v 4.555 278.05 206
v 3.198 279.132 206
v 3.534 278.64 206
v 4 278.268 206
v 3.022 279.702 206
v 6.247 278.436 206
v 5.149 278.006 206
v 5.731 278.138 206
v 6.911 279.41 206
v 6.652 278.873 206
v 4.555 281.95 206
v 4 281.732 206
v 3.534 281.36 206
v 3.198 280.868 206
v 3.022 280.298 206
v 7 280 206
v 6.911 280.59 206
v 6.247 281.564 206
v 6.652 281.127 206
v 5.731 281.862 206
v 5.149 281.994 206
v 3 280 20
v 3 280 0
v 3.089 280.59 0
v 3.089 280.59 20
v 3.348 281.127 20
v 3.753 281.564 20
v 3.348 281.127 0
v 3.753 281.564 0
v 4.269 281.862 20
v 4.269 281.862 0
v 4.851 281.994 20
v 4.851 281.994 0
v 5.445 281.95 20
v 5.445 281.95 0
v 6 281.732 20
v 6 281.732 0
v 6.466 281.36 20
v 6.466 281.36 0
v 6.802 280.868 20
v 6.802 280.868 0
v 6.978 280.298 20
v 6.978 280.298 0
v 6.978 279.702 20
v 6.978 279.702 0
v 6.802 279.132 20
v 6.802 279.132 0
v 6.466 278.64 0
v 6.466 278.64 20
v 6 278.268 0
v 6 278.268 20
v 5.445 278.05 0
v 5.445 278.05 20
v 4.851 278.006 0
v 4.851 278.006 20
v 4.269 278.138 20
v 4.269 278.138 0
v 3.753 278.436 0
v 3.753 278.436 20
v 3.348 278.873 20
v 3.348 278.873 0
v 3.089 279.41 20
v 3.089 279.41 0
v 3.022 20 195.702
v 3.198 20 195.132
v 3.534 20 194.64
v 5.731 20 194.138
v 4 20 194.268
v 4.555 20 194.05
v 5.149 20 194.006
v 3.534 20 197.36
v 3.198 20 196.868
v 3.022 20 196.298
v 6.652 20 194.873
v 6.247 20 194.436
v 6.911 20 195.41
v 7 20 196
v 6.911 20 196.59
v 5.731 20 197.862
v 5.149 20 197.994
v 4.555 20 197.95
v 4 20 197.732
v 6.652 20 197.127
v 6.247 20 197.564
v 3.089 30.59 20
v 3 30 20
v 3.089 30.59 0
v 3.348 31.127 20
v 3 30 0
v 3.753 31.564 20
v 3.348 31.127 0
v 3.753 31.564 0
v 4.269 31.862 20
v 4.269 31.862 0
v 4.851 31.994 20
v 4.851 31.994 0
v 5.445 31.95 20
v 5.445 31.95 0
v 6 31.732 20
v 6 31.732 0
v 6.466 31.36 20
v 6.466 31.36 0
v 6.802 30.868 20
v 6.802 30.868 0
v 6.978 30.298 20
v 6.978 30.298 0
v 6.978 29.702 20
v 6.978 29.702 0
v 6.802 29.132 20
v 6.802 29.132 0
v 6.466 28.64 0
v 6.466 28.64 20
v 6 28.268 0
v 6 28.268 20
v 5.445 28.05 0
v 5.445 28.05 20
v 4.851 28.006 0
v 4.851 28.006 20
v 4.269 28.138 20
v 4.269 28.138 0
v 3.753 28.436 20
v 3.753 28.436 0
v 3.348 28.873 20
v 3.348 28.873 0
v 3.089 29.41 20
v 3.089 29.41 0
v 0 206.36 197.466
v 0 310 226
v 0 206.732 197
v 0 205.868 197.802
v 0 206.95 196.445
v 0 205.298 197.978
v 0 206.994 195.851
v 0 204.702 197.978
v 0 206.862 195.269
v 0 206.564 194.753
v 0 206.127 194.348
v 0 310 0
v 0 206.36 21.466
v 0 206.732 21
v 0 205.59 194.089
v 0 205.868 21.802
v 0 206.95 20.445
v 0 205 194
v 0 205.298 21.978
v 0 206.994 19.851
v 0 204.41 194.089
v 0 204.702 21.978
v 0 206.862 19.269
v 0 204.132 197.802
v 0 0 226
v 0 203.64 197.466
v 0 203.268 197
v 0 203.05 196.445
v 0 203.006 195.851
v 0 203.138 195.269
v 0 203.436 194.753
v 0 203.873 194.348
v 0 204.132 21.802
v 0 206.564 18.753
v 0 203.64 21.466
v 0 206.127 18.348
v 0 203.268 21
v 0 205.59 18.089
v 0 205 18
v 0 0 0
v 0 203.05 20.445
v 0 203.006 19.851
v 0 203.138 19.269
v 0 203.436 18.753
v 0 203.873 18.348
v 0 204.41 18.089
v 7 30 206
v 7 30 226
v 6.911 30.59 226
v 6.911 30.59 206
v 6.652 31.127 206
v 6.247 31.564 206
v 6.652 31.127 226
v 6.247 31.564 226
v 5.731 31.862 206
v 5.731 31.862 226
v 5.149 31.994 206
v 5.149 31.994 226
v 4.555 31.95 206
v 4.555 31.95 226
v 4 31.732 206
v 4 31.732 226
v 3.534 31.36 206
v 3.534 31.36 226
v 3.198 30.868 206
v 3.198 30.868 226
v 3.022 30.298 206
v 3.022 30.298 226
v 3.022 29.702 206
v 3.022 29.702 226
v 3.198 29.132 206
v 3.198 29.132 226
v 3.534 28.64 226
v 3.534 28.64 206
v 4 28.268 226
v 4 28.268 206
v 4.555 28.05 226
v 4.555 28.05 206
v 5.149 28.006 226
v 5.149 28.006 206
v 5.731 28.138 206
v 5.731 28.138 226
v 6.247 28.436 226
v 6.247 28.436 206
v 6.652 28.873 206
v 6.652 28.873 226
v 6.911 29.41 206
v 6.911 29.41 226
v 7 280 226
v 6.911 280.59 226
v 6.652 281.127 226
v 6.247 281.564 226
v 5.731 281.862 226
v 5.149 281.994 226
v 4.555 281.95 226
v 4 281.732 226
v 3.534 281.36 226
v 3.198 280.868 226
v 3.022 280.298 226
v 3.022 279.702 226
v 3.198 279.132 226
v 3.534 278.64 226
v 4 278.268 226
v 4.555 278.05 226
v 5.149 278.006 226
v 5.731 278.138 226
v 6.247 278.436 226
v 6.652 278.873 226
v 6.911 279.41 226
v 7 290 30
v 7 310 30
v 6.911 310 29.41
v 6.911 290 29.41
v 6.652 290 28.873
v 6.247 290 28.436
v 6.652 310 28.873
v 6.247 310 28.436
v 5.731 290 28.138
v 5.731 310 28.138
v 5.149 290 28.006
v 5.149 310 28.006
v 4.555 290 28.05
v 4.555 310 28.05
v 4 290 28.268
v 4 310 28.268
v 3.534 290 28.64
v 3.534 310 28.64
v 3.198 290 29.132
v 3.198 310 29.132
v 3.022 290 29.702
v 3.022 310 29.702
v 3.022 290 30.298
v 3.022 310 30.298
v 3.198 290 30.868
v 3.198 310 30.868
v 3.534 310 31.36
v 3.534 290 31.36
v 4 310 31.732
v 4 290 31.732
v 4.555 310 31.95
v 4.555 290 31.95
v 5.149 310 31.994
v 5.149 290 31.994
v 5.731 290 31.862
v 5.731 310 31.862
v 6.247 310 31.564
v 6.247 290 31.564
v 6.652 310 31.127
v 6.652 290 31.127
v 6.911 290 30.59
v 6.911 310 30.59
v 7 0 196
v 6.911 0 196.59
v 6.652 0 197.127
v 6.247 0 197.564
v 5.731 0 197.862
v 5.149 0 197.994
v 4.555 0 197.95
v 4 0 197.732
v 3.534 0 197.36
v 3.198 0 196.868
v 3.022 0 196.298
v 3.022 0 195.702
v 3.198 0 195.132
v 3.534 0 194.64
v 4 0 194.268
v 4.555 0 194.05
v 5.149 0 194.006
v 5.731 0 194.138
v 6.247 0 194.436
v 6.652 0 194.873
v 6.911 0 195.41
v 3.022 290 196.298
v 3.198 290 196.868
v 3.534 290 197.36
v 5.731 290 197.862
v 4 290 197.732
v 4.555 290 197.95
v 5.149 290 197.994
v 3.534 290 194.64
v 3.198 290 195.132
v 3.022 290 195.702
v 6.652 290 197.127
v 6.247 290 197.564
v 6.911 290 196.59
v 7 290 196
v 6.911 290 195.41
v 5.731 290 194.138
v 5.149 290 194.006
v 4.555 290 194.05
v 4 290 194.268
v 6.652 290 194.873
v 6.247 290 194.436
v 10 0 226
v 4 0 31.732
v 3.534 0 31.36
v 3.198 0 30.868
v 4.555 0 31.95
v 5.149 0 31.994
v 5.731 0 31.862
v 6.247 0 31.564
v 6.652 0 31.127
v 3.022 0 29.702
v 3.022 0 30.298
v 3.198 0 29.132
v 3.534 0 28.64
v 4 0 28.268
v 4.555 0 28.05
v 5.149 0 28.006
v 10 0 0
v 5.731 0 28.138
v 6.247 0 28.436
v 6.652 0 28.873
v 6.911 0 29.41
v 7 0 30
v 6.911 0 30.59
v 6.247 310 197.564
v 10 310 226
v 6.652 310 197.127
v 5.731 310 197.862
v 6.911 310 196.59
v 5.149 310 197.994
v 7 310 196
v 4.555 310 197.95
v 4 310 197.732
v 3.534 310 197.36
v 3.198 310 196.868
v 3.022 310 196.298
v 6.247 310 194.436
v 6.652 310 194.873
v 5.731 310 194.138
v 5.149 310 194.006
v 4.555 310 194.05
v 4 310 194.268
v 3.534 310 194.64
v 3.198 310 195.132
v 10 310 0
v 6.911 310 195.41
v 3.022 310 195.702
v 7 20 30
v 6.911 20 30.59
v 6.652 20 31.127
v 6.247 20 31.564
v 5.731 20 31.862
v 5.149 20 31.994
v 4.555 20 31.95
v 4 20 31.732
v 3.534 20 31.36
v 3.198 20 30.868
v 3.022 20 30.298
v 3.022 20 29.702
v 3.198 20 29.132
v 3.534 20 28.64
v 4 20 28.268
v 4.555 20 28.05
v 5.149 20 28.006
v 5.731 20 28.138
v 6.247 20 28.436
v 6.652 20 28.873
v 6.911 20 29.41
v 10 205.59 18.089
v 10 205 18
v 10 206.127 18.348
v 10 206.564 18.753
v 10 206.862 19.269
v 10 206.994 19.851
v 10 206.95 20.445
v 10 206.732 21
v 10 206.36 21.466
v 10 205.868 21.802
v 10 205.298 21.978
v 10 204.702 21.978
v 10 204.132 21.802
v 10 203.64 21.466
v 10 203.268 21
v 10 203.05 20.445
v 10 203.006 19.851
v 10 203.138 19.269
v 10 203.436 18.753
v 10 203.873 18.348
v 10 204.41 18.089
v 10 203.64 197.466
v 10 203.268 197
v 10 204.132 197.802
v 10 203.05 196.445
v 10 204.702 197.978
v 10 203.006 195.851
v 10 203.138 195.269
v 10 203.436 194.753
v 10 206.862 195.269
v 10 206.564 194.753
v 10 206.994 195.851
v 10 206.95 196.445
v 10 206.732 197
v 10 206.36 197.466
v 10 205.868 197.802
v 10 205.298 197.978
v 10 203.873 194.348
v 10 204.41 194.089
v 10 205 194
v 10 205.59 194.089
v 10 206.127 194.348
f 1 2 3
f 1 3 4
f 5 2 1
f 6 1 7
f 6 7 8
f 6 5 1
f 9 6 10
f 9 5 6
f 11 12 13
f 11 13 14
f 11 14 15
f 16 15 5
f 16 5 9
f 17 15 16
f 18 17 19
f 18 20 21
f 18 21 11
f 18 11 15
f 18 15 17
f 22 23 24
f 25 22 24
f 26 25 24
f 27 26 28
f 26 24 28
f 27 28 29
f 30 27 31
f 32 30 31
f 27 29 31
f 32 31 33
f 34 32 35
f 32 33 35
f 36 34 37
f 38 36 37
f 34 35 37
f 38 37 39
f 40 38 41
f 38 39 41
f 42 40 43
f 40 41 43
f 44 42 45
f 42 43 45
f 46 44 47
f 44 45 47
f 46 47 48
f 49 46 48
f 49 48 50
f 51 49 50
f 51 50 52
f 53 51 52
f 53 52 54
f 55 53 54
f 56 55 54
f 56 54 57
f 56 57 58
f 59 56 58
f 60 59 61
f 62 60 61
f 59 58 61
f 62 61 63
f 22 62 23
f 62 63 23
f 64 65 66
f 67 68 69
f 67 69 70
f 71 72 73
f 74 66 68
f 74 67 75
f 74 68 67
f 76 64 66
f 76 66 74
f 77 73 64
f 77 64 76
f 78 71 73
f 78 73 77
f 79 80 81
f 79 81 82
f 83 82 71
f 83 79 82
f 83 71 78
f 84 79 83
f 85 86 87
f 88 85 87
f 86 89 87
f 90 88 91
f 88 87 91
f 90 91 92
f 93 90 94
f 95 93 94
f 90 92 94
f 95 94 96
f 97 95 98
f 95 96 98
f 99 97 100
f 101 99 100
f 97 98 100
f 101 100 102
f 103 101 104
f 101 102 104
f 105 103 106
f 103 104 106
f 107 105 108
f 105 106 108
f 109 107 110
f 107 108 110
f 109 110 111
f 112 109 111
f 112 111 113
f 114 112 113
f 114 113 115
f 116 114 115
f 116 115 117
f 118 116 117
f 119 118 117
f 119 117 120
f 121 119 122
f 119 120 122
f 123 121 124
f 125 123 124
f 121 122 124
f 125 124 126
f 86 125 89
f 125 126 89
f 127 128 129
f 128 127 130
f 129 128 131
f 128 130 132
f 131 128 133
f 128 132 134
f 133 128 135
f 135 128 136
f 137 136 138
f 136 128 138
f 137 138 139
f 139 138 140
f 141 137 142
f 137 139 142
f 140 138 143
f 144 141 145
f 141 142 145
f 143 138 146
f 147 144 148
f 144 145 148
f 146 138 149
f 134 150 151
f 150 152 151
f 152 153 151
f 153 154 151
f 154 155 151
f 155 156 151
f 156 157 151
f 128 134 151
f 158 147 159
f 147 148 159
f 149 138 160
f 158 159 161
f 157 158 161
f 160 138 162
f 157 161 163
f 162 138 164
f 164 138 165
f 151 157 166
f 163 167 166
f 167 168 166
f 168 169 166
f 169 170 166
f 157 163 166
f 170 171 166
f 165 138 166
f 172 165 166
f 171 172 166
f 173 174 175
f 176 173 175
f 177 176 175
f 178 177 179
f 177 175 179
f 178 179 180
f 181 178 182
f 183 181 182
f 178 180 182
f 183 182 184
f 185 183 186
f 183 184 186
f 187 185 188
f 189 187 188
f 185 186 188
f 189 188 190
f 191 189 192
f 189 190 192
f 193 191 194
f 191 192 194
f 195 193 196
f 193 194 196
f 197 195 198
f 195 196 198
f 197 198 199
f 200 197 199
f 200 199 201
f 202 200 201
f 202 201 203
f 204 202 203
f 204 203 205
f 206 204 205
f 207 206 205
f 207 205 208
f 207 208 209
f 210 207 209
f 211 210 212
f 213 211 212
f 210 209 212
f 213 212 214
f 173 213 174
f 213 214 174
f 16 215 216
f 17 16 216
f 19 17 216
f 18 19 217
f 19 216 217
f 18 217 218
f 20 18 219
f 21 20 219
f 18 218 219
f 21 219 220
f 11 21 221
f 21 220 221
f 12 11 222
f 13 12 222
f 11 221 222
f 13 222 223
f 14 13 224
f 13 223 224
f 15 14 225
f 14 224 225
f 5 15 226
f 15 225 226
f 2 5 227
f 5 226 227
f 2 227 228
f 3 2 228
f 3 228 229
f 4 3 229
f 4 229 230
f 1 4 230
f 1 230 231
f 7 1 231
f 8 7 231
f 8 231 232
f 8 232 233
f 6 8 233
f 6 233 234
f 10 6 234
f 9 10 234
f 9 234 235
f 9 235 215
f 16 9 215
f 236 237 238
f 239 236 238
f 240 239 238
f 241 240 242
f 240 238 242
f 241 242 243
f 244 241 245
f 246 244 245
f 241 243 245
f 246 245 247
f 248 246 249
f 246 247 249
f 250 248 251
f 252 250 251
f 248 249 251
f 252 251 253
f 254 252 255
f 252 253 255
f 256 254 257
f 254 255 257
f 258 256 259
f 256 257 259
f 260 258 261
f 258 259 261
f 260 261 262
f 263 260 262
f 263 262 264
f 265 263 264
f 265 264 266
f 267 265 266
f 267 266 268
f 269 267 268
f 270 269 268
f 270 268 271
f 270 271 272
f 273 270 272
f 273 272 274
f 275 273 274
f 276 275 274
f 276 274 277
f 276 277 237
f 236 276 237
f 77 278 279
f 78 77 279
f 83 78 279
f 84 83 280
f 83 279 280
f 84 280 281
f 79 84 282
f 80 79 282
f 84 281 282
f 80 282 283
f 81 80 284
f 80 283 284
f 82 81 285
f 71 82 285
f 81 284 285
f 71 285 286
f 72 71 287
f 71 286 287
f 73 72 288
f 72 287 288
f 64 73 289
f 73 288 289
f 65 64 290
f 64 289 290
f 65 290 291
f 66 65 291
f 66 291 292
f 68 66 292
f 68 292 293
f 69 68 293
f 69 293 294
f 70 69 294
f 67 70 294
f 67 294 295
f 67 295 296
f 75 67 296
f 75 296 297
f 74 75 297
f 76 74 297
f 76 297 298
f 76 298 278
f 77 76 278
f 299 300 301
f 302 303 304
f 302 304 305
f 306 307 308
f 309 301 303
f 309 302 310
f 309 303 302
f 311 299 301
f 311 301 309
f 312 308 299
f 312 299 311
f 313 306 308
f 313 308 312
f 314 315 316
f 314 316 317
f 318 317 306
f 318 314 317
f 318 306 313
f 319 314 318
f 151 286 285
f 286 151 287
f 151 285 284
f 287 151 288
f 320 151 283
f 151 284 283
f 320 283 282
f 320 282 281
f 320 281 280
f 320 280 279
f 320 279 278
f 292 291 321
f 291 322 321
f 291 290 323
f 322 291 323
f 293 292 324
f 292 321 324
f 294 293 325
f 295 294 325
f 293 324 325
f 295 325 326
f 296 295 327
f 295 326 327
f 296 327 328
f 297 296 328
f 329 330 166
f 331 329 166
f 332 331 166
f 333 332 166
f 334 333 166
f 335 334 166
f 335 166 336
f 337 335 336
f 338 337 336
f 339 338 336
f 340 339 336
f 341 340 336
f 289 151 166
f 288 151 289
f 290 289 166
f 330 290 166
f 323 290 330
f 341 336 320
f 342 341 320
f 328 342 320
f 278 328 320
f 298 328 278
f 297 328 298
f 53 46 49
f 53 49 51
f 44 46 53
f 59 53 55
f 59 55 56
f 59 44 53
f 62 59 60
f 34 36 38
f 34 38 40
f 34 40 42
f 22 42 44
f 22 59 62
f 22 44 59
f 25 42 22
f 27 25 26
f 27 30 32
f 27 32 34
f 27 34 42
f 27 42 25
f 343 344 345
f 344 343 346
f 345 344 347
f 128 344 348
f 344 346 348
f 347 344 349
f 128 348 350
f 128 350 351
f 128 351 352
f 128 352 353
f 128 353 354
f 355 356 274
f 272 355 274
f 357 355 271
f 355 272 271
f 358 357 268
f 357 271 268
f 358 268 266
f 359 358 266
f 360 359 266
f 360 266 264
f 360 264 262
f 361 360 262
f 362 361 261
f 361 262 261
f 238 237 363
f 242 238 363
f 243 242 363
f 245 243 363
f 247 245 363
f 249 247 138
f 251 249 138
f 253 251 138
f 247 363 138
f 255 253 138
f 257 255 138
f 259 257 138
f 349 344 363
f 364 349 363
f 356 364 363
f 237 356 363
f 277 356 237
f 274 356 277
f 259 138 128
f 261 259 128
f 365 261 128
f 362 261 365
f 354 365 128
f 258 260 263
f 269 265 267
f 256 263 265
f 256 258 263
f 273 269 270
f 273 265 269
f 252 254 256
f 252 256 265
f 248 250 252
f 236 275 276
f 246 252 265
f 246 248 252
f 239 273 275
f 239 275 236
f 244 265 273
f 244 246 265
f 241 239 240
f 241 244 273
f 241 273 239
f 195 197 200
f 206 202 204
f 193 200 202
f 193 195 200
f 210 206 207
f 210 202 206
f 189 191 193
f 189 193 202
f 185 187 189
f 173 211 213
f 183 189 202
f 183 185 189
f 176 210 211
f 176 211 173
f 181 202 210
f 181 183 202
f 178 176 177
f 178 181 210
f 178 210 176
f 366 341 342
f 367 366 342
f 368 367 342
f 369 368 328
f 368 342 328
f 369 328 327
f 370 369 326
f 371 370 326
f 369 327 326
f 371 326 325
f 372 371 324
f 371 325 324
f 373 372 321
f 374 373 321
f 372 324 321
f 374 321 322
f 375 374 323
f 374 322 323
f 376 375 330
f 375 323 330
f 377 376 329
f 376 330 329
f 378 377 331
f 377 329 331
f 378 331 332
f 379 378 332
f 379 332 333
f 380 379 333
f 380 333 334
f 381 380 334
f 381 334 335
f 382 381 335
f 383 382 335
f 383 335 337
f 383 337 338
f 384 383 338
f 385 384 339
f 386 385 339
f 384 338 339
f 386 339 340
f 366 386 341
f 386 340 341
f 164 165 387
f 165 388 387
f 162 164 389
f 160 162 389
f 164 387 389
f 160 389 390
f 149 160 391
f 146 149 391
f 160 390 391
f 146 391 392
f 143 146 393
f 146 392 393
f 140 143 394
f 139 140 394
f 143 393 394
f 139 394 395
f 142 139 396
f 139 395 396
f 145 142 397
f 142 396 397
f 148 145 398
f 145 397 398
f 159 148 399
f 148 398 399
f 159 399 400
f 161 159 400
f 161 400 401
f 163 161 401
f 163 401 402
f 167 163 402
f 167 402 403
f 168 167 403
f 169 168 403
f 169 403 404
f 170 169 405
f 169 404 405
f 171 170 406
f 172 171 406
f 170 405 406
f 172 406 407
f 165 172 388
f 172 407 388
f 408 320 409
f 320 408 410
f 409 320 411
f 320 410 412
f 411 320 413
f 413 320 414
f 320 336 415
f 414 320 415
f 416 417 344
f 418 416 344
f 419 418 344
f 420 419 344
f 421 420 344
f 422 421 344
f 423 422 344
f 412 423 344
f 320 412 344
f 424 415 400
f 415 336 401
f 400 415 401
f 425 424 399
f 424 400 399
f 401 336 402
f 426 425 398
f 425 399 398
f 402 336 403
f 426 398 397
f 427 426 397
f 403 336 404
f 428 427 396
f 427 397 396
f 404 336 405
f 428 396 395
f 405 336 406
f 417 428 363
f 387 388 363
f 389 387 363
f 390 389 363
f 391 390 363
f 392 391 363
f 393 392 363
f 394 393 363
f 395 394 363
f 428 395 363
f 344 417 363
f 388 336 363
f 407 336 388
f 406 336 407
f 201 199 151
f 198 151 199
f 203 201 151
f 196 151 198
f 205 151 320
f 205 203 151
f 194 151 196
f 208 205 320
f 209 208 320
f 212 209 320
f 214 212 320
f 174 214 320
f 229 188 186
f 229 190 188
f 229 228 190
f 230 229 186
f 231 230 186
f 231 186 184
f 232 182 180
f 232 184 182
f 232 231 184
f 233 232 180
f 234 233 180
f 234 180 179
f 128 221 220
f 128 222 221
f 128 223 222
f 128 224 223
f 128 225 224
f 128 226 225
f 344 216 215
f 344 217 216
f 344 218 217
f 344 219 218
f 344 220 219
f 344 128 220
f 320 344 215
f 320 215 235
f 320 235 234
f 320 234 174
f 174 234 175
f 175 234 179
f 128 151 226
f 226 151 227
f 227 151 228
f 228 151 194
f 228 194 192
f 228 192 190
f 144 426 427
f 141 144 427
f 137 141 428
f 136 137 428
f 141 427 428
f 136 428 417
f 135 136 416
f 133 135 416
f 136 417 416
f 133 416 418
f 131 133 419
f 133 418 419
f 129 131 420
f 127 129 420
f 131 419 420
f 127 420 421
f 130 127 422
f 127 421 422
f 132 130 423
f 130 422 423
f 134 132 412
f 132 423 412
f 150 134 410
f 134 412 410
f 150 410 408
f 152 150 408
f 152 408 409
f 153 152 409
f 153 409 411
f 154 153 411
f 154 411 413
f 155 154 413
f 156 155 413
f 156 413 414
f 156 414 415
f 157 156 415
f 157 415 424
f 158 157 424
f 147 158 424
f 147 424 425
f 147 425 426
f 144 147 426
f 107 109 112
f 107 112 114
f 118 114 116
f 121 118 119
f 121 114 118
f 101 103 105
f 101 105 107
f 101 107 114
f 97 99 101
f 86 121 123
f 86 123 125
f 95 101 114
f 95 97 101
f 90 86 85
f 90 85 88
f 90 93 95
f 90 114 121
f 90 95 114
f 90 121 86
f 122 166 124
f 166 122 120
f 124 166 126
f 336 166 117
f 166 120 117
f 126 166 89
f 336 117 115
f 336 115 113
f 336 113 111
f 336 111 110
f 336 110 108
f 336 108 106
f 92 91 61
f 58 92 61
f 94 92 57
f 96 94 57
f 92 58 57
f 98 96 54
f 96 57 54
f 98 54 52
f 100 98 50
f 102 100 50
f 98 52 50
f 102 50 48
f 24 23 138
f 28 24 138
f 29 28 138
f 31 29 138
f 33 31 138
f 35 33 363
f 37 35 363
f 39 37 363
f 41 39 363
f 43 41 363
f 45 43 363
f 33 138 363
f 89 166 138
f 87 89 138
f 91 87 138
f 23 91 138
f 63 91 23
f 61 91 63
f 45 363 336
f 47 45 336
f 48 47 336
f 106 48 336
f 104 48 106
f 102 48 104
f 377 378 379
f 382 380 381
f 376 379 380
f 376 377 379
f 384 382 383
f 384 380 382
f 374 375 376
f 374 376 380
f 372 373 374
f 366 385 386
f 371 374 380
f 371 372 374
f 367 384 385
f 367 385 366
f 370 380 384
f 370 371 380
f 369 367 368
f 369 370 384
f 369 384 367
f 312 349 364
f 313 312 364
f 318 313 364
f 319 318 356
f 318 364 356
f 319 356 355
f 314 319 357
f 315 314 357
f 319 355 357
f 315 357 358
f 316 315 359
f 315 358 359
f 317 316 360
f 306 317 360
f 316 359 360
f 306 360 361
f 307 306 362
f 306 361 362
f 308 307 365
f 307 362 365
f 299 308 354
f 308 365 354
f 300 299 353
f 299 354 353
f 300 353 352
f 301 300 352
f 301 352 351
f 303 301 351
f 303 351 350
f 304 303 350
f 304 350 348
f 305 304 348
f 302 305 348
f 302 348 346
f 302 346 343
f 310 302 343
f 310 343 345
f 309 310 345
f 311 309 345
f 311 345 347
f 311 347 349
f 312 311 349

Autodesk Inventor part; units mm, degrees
ref_plane "YZ Plane" through (0, 0, 0) normal (1, 0, 0) x (0, 1, 0)
ref_plane "XZ Plane" through (0, 0, 0) normal (0, 1, 0) x (-1, 0, 0)
ref_plane "XY Plane" through (0, 0, 0) normal (0, 0, 1) x (1, 0, 0)
sketch "Sketch1" plane through (0, 0, 0) normal (0, 0, 1) x (1, 0, 0)
  line L0 (0, 0) -> (10, 0)
  line L1 (10, 0) -> (10, 310)
  line L2 (10, 310) -> (0, 310)
  line L3 (0, 310) -> (0, 0)
  dimension "d0" = 10
  dimension "d1" = 310
extrude "Extrusion1" add sketch "Sketch1" along normal blind 226
sketch "Sketch2" plane through (0, 0, 226) normal (0, 0, 1) x (1, 0, 0)
  circle A0 centre (5, 30) radius 2
  line L0 (0, 0) -> (10, 0) projected
  line L1 (0, 310) -> (0, 0) projected
  circle A1 centre (5, 280) radius 2
  dimension "d4" = 4
  dimension "d5" = 30
  dimension "d6" = 5
  dimension "d9" = 250
extrude "Extrusion2" cut sketch "Sketch2" against normal blind 20
sketch "Sketch3" plane through (0, 0, 0) normal (0, 0, -1) x (-1, 0, 0)
  circle A0 centre (-5, 30) radius 2
  line L0 (0, 0) -> (-10, 0) projected
  line L1 (-10, 0) -> (-10, 310) projected
  circle A1 centre (-5, 280) radius 2
  dimension "d16" = 4
  dimension "d17" = 30
  dimension "d18" = 5
  dimension "d21" = 250
extrude "Extrusion3" cut sketch "Sketch3" against normal blind 20
sketch "Sketch4" plane through (0, 0, 0) normal (0, -1, 0) x (1, 0, 0)
  circle A0 centre (5, 30) radius 2
  line L0 (0, 0) -> (10, 0) projected
  line L1 (0, 0) -> (0, 226) projected
  circle A1 centre (5, 196) radius 2
  dimension "d28" = 4
  dimension "d29" = 30
  dimension "d30" = 5
  dimension "d33" = 166
extrude "Extrusion4" cut sketch "Sketch4" against normal blind 20
sketch "Sketch5" plane through (10, 0, 0) normal (1, 0, 0) x (0, 0, -1)
  circle A0 centre (-196, 205) radius 2
  line L0 (0, 0) -> (-226, 0) projected
  line L1 (-226, 0) -> (-226, 310) projected
  circle A1 centre (-20, 205) radius 2
  dimension "d40" = 4
  dimension "d41" = 205
  dimension "d42" = 30
  dimension "d45" = 176
extrude "Extrusion5" cut sketch "Sketch5" against normal through all
sketch "Sketch6" plane through (0, 310, 0) normal (0, 1, 0) x (1, 0, 0)
  circle A0 centre (5, -30) radius 2
  line L0 (10, 0) -> (10, -226) projected
  line L1 (10, 0) -> (0, 0) projected
  circle A1 centre (5, -196) radius 2
  dimension "d52" = 4
  dimension "d53" = 5
  dimension "d54" = 30
  dimension "d57" = 166
extrude "Extrusion6" cut sketch "Sketch6" against normal blind 20
equation "\"d40\" = screws"
equation "\"d52\" = screws"
equation "\"screws\" = 4"
properties part number "box_side"
